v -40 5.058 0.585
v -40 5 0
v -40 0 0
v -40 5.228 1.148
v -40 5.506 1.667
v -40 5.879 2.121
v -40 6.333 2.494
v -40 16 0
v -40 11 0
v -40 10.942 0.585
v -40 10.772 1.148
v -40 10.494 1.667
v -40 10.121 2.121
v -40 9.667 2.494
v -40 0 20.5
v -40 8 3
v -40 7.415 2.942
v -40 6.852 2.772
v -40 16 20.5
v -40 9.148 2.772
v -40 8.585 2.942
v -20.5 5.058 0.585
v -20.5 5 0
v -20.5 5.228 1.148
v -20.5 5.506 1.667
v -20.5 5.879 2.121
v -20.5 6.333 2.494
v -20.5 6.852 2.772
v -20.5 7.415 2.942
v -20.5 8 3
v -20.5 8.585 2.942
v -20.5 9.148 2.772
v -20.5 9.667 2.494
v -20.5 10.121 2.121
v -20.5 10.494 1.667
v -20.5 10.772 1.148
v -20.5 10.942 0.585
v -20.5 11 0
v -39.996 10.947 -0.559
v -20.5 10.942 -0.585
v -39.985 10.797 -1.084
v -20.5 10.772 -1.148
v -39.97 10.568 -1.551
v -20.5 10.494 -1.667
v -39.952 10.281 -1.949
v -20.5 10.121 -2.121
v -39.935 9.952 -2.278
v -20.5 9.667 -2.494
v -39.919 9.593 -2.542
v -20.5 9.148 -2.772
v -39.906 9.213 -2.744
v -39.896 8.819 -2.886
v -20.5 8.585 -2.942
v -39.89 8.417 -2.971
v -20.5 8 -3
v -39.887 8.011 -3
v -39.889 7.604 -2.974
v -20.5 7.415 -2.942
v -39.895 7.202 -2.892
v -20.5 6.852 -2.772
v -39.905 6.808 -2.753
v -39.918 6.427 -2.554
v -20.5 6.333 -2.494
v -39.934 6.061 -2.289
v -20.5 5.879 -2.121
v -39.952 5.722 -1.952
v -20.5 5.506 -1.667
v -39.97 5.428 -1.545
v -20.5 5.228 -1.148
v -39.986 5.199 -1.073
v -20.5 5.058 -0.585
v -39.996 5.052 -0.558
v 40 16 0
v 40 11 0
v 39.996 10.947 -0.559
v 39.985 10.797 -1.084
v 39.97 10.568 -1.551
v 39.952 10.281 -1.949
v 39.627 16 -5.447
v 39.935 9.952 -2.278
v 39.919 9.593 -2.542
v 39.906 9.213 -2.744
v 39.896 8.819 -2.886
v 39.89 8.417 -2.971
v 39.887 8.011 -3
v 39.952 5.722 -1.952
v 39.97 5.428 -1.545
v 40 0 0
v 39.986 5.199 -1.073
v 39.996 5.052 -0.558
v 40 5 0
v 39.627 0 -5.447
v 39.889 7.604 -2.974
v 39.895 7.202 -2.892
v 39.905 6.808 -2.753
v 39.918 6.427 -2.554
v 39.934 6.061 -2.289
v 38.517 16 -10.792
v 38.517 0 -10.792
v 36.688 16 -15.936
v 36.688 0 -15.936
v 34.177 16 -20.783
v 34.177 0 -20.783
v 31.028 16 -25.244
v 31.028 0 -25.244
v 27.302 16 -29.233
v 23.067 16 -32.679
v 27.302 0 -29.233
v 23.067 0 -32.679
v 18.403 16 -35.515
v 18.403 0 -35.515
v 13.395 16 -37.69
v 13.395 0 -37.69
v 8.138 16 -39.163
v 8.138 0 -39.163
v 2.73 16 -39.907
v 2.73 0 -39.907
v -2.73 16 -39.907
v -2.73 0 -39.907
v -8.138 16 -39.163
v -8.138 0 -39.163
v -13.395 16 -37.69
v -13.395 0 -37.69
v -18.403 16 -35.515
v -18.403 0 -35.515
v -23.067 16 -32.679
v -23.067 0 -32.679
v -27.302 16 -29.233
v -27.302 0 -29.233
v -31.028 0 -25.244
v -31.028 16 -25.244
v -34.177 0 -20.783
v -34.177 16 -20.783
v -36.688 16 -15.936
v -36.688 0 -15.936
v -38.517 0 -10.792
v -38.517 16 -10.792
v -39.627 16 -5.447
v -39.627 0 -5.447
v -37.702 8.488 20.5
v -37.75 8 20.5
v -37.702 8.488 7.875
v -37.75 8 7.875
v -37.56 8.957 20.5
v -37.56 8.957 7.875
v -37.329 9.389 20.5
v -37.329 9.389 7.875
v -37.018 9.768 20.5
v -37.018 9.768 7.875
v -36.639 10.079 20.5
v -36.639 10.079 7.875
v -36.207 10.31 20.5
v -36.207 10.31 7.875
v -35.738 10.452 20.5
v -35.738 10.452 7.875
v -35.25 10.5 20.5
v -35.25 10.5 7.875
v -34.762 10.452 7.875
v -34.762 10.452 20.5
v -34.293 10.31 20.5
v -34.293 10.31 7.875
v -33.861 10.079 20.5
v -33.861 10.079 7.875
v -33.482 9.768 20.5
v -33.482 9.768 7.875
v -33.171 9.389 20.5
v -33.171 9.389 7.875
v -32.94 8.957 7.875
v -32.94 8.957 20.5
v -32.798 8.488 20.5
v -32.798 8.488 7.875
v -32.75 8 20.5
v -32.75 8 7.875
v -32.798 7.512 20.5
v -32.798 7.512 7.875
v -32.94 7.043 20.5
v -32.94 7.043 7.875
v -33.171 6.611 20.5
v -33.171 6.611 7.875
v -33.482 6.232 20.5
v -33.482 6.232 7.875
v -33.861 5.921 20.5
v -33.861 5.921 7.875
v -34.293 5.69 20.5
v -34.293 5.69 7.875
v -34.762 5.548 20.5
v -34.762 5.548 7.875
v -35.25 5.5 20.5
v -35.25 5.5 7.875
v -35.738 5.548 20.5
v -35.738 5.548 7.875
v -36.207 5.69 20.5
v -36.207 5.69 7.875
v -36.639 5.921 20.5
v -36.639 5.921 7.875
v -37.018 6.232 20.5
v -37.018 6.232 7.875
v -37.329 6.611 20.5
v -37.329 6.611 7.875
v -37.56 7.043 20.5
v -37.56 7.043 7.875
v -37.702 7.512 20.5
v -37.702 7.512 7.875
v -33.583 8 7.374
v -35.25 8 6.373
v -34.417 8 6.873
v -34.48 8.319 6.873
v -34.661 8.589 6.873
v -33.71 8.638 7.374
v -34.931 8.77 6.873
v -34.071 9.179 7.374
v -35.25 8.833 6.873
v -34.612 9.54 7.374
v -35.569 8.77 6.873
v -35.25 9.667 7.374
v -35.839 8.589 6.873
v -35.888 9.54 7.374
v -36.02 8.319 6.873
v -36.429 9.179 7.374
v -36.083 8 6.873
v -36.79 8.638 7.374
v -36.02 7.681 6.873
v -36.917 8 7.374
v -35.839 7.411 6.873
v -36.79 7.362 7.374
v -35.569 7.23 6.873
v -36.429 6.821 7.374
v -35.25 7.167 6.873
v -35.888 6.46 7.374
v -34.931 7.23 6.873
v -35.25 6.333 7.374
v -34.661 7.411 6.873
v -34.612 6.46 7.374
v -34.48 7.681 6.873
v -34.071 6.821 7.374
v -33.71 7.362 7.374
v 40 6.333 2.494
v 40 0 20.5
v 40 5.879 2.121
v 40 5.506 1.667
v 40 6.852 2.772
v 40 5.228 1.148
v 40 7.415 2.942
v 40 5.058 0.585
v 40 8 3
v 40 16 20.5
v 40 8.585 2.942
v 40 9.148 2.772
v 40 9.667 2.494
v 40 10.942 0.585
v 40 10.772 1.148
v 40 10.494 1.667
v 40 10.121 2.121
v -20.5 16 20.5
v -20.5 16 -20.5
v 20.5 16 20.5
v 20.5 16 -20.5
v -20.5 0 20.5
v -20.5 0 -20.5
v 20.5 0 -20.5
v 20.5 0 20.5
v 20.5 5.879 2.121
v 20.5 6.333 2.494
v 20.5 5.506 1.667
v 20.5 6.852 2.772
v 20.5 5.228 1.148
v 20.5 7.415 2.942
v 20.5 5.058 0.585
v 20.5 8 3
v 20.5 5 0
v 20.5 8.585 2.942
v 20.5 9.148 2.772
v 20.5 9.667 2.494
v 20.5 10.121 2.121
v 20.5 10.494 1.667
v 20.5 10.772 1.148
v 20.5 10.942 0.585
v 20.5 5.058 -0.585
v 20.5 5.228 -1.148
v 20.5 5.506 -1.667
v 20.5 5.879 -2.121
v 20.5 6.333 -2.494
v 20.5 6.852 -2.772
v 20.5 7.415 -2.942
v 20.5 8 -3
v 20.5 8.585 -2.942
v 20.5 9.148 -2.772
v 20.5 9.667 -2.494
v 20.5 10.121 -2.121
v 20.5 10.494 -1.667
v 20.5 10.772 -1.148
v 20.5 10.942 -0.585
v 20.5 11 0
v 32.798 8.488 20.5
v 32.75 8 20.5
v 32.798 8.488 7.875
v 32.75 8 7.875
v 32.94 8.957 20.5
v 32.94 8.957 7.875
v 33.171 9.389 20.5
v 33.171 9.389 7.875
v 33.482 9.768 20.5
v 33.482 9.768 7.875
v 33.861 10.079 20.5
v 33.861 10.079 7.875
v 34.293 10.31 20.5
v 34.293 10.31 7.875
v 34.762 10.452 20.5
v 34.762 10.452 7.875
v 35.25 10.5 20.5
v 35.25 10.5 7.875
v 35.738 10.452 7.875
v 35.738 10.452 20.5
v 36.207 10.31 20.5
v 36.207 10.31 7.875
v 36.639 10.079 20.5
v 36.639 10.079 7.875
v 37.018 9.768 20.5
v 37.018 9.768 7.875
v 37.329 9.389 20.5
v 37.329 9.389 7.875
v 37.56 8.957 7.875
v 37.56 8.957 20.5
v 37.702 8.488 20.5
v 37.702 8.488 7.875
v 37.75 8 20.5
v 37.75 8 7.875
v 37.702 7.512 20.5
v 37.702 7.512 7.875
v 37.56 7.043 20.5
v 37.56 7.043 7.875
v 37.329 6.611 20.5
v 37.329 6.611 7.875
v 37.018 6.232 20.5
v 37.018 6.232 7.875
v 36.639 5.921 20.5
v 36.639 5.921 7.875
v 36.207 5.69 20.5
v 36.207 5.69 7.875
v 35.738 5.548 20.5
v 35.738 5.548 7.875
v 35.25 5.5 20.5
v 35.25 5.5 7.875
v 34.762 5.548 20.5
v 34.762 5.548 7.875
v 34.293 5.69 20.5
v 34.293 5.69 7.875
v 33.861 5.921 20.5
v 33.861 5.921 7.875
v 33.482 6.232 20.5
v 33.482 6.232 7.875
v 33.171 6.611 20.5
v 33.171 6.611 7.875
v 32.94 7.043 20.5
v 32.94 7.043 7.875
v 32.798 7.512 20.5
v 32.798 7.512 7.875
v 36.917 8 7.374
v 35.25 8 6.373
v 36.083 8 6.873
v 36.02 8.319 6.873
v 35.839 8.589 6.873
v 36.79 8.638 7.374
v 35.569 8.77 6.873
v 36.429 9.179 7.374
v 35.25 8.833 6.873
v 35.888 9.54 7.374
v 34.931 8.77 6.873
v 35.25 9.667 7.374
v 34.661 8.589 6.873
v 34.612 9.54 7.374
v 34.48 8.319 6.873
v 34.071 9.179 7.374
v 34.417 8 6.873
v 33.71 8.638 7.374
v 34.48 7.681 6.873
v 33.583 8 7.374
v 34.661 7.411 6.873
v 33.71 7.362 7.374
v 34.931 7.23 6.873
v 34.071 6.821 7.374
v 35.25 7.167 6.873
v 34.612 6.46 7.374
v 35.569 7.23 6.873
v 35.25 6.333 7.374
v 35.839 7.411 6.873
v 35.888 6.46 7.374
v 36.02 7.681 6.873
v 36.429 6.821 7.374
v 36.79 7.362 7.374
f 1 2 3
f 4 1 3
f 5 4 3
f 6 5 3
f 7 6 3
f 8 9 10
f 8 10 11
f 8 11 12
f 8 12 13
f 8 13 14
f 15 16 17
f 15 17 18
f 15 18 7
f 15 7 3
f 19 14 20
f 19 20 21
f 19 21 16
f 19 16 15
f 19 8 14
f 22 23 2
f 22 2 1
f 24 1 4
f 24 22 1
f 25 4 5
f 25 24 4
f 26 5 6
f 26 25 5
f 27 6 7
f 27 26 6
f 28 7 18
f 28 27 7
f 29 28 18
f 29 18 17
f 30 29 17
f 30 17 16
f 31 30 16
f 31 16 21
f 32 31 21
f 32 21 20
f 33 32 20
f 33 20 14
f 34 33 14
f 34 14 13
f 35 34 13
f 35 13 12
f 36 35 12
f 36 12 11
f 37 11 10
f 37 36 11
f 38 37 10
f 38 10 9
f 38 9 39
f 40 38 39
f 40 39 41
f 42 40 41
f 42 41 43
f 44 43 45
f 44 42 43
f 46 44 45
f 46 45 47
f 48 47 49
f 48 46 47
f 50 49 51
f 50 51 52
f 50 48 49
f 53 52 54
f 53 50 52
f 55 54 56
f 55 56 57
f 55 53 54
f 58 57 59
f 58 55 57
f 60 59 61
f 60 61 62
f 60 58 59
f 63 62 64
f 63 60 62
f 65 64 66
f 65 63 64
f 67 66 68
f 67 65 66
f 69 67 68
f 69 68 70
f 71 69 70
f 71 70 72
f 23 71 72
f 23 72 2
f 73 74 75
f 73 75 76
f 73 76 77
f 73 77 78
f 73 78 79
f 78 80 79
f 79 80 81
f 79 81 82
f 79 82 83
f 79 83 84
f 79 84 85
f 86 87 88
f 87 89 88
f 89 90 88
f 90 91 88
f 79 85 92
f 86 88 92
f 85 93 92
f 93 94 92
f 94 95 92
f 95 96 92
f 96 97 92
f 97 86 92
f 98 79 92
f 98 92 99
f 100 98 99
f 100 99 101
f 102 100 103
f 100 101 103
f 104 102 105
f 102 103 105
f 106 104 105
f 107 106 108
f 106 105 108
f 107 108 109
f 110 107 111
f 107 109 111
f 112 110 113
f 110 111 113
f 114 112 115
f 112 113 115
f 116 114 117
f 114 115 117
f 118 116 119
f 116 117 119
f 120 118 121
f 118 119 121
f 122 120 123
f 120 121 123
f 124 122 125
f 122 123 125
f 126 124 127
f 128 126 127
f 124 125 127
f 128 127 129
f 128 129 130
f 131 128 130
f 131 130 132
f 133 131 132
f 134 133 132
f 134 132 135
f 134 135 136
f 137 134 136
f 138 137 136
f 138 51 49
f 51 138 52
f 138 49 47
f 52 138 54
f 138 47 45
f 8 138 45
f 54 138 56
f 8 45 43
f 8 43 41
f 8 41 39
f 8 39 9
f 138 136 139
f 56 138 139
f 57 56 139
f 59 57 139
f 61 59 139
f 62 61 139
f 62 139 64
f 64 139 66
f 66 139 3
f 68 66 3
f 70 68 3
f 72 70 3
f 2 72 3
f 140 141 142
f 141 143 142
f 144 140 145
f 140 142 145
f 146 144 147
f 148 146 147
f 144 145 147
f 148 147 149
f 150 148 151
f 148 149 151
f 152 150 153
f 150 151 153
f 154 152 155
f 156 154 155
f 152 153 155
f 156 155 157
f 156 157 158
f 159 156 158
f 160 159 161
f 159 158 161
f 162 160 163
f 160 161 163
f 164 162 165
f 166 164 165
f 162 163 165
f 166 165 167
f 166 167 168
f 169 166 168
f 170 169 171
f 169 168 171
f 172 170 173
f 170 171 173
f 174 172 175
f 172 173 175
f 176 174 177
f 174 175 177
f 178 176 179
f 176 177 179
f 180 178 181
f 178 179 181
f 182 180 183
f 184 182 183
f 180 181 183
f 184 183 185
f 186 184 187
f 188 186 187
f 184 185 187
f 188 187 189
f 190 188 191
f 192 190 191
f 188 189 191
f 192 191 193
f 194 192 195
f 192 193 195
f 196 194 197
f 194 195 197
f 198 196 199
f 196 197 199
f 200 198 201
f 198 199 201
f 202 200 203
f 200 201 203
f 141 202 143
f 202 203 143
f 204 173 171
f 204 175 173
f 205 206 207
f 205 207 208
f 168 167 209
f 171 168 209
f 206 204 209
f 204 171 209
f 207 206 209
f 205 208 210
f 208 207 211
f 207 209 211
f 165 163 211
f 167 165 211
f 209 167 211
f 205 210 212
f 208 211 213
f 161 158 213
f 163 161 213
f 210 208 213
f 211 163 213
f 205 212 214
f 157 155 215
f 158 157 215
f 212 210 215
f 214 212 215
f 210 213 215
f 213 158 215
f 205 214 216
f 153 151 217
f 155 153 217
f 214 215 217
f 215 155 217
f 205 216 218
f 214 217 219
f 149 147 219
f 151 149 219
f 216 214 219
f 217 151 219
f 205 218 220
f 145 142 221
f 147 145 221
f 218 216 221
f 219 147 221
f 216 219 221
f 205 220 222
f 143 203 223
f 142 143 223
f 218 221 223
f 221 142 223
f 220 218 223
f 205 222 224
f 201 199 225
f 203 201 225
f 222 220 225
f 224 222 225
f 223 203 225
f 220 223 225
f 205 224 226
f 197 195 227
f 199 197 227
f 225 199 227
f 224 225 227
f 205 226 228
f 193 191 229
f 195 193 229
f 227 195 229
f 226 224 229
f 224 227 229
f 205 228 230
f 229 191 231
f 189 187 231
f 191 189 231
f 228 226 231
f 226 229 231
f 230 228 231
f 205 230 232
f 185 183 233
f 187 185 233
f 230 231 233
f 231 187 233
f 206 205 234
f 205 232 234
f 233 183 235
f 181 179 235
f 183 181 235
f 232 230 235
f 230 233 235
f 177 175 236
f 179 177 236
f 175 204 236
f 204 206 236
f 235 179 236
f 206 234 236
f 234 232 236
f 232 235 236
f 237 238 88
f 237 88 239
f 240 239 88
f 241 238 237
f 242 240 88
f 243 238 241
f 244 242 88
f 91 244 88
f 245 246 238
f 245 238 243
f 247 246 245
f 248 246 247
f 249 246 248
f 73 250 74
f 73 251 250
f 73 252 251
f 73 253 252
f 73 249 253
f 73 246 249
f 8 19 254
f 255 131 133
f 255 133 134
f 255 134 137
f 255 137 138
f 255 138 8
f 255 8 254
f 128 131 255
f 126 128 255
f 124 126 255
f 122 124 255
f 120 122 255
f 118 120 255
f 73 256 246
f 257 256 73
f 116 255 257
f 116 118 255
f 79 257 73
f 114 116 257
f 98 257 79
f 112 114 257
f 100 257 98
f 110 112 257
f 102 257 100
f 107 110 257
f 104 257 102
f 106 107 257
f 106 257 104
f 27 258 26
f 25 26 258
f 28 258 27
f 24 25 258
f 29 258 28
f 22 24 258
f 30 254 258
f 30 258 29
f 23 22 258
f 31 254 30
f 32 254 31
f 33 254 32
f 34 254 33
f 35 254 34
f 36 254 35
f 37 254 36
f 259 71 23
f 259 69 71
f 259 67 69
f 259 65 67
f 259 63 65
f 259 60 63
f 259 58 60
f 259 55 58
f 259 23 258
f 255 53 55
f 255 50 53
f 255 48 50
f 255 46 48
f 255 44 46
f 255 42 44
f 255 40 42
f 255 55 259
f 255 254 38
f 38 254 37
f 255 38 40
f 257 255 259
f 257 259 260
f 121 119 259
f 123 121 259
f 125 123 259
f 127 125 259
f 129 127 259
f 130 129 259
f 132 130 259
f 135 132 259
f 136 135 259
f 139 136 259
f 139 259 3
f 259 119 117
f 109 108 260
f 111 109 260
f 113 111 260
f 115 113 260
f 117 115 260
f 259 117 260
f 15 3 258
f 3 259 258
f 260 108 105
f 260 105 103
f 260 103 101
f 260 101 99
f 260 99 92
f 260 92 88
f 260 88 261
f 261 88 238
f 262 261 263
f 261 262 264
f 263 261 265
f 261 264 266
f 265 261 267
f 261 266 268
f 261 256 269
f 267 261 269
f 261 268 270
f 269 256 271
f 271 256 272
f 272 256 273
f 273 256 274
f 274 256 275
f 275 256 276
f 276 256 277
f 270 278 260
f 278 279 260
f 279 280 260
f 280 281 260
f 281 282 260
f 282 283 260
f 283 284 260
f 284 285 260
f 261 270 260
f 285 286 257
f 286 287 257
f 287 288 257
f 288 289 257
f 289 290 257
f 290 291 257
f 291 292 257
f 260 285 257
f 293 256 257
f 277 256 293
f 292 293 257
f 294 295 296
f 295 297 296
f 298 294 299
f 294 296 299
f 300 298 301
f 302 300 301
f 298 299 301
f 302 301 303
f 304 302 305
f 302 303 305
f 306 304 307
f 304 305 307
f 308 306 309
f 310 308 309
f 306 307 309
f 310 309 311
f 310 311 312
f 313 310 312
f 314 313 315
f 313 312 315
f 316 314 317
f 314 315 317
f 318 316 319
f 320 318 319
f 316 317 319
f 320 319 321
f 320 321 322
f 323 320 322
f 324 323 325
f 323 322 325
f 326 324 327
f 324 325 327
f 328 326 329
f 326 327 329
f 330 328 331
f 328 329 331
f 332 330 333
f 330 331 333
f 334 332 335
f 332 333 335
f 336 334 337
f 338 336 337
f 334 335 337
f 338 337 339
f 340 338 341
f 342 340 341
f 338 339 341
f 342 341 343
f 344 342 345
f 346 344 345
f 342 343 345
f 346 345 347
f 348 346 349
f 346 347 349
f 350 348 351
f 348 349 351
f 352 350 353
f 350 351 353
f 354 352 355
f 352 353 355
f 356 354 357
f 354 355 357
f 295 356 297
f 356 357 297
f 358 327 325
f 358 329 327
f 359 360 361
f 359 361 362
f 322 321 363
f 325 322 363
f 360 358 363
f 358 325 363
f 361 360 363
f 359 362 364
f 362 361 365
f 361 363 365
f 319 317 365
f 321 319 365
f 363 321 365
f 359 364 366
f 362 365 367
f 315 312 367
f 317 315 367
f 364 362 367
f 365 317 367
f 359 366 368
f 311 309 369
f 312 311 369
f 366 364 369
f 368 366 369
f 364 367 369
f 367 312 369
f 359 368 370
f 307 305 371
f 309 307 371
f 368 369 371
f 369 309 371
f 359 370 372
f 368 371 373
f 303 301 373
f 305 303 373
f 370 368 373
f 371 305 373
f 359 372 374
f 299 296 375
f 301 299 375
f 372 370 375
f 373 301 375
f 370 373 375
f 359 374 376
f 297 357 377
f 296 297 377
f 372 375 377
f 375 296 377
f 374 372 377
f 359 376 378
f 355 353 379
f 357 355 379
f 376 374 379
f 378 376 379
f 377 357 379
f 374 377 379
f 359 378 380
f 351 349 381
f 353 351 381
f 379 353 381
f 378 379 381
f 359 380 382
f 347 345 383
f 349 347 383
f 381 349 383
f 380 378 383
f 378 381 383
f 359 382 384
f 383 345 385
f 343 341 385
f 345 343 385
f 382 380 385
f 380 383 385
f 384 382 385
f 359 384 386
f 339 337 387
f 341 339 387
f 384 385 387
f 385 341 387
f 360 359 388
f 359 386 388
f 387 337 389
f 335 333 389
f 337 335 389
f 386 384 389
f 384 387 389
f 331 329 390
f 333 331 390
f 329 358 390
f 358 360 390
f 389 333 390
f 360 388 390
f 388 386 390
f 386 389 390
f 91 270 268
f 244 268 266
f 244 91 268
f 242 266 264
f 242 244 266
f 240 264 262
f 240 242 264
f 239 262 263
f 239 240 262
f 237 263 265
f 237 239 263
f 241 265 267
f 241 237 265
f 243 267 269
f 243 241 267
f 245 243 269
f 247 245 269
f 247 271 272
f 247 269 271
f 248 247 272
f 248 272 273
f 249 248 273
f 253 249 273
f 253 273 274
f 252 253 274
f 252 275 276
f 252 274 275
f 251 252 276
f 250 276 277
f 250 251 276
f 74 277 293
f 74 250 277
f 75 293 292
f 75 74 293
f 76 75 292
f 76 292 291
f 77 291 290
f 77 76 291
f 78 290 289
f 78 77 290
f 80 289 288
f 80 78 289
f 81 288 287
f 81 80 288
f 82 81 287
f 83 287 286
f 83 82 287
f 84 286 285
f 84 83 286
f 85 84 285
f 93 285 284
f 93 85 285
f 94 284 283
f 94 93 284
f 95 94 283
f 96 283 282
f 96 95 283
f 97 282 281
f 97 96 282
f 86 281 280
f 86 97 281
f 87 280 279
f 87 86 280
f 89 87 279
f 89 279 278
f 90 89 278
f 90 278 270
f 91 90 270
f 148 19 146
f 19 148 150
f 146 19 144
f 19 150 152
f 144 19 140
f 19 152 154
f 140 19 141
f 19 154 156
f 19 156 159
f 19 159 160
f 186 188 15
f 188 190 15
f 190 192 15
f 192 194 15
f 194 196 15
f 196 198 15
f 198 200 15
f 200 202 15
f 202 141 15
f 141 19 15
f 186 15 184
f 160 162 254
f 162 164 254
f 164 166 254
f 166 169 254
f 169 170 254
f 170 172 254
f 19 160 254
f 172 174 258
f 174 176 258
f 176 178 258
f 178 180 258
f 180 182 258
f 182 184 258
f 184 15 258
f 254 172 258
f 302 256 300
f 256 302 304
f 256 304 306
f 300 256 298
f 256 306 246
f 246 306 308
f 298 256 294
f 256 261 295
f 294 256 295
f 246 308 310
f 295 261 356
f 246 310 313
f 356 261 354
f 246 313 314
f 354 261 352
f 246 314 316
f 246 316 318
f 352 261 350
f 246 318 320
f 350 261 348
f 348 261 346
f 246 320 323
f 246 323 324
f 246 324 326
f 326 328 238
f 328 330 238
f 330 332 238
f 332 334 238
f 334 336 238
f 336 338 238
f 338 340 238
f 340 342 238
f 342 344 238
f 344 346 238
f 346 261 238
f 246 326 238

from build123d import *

# Parameters (mm, degrees)
SKETCH1_R                 = 40
BOSS_EXTRUDE1_DEPTH       = 16
SKETCH2_W                 = 41
SKETCH2_H                 = 41
CUT_EXTRUDE1_DEPTH        = 59.787753827
SKETCH13_W                = 61
SKETCH13_H                = 46
BOSS_EXTRUDE4_DEPTH       = 75
SKETCH14_W                = 49
SKETCH14_H                = 67
CUT_EXTRUDE2_DEPTH        = 35
SKETCH15_W                = 49
SKETCH15_H                = 61
CUT_EXTRUDE3_DEPTH        = 5
FILLET1_R                 = 10
FILLET2_R                 = 5
CUT_EXTRUDE5_REACH        = 110.08
SKETCH17_R                = 41
BOSS_EXTRUDE5_DEPTH       = 16
CUT_EXTRUDE4_DEPTH        = 118.224144271
CUT_EXTRUDE4_DEPTH_BACK   = 118.224144271
SKETCH16_R                = 3
F_5_0MM_DOWEL_HOLE1_D     = 5
F_5_0MM_DOWEL_HOLE1_DEPTH = 25
F_5_0MM_DOWEL_HOLE1_TIP   = 1.502151548
CUT_EXTRUDE6_DEPTH        = 109.079831643
CUT_EXTRUDE6_DEPTH_BACK   = 109.079831643
SKETCH21_W                = 80
SKETCH21_H                = 75


with BuildPart() as part:
    # Sketch1 → Boss-Extrude1 (new body)
    with BuildSketch(Plane(origin=(0, 0, 0), x_dir=(1, 0, 0), z_dir=(0, 1, 0))):
        with Locations(Location((0, 0, 0), (0, 0, 270))):
            Circle(SKETCH1_R)
    extrude(amount=BOSS_EXTRUDE1_DEPTH)

    # Sketch2 → Cut-Extrude1 (cut, through all)
    with BuildSketch(Plane(origin=(0, 16, 0), x_dir=(1, 0, 0), z_dir=(0, 1, 0))):
        Rectangle(SKETCH2_W, SKETCH2_H)
    extrude(amount=-CUT_EXTRUDE1_DEPTH, mode=Mode.SUBTRACT)

    # Sketch13 → Boss-Extrude4 (add)
    with BuildSketch(Plane(origin=(0, 0, 20.5), x_dir=(-1, 0, 0), z_dir=(0, 0, -1))):
        with Locations((0, 8)):
            Rectangle(SKETCH13_W, SKETCH13_H)
    extrude(amount=-BOSS_EXTRUDE4_DEPTH)

    # Sketch14 → Cut-Extrude2 (cut)
    with BuildSketch(Plane(origin=(0, 31, 0), x_dir=(1, 0, 0), z_dir=(0, 1, 0))):
        with Locations((0, -62)):
            Rectangle(SKETCH14_W, SKETCH14_H)
    extrude(amount=-CUT_EXTRUDE2_DEPTH, mode=Mode.SUBTRACT)

    # Sketch15 → Cut-Extrude3 (cut)
    with BuildSketch(Plane(origin=(0, -4, 0), x_dir=(1, 0, 0), z_dir=(0, 1, 0))):
        with Locations((0, -59)):
            Rectangle(SKETCH15_W, SKETCH15_H)
    extrude(amount=-CUT_EXTRUDE3_DEPTH, mode=Mode.SUBTRACT)

    # Fillet1
    fillet1_edges = [part.edges().sort_by_distance(p)[0] for p in [
        (-27.5, 31, 95.5),
        (27.5, 31, 95.5),
    ]]
    fillet(fillet1_edges, radius=FILLET1_R)

    # Fillet2
    fillet2_edges = [part.edges().sort_by_distance(p)[0] for p in [
        (0, -9, 89.5),
        (0, -15, 95.5),
        (0, -15, 20.5),
        (0, -9, 28.5),
    ]]
    fillet(fillet2_edges, radius=FILLET2_R - 0.0001)  # a hair under: the kernel refuses the full size

    # Sketch17 → Cut-Extrude5 (cut, up to next)
    with BuildSketch(Plane(origin=(0, 16, 0), x_dir=(1, 0, 0), z_dir=(0, 1, 0)), mode=Mode.PRIVATE) as cut_extrude5_sk1:
        Circle(SKETCH17_R)
    cut_extrude5_tool1 = extrude(cut_extrude5_sk1.sketch, amount=CUT_EXTRUDE5_REACH, mode=Mode.PRIVATE) & part.part
    add(cut_extrude5_tool1.solids().sort_by_distance((0, 16, 0))[0], mode=Mode.SUBTRACT)

    # Sketch18 → Boss-Extrude5 (add)
    with BuildSketch(Plane(origin=(0, 16, 0), x_dir=(1, 0, 0), z_dir=(0, 1, 0))):
        Polygon((20.5, 0), (20.5, -20.5), (-20.5, -20.5), (-20.5, 0), (-40, 0), (-40, -32.874762357), (-24.5, -32.874762357), (-24.5, -28.5), (24.5, -28.5), (24.5, -32.874762357), (40, -32.874762357), (40, 0), align=None)
    extrude(amount=-BOSS_EXTRUDE5_DEPTH)

    # Sketch16 → Cut-Extrude4 (cut, two sides: drawn at the far end of the back side and taken through both)
    with BuildSketch(Plane.ZY.offset(-20.5).offset(-CUT_EXTRUDE4_DEPTH_BACK)):
        with Locations(Location((0, 8, 0), (0, 0, 270))):
            Circle(SKETCH16_R)
    extrude(amount=CUT_EXTRUDE4_DEPTH + CUT_EXTRUDE4_DEPTH_BACK, mode=Mode.SUBTRACT)

    # Ø5.0mm Dowel Hole1
    with Locations(Plane(origin=(-35.25, 8, 32.874762357), x_dir=(1, 0, 0), z_dir=(0, 0, 1))):
        with Locations((0, 0), (70.5, 0)):
            Hole(F_5_0MM_DOWEL_HOLE1_D / 2, depth=F_5_0MM_DOWEL_HOLE1_DEPTH)
            with Locations((0, 0, -(F_5_0MM_DOWEL_HOLE1_DEPTH + F_5_0MM_DOWEL_HOLE1_TIP / 2))):  # 118° drill point
                Cone(0, F_5_0MM_DOWEL_HOLE1_D / 2, F_5_0MM_DOWEL_HOLE1_TIP, mode=Mode.SUBTRACT)

    # Sketch21 → Cut-Extrude6 (cut, two sides: drawn at the far end of the back side and taken through both)
    with BuildSketch(Plane(origin=(0, 16, 0), x_dir=(1, 0, 0), z_dir=(0, 1, 0)).offset(-CUT_EXTRUDE6_DEPTH_BACK)):
        with Locations((0, -58)):
            Rectangle(SKETCH21_W, SKETCH21_H)
    extrude(amount=CUT_EXTRUDE6_DEPTH + CUT_EXTRUDE6_DEPTH_BACK, mode=Mode.SUBTRACT)


solid = part.part
